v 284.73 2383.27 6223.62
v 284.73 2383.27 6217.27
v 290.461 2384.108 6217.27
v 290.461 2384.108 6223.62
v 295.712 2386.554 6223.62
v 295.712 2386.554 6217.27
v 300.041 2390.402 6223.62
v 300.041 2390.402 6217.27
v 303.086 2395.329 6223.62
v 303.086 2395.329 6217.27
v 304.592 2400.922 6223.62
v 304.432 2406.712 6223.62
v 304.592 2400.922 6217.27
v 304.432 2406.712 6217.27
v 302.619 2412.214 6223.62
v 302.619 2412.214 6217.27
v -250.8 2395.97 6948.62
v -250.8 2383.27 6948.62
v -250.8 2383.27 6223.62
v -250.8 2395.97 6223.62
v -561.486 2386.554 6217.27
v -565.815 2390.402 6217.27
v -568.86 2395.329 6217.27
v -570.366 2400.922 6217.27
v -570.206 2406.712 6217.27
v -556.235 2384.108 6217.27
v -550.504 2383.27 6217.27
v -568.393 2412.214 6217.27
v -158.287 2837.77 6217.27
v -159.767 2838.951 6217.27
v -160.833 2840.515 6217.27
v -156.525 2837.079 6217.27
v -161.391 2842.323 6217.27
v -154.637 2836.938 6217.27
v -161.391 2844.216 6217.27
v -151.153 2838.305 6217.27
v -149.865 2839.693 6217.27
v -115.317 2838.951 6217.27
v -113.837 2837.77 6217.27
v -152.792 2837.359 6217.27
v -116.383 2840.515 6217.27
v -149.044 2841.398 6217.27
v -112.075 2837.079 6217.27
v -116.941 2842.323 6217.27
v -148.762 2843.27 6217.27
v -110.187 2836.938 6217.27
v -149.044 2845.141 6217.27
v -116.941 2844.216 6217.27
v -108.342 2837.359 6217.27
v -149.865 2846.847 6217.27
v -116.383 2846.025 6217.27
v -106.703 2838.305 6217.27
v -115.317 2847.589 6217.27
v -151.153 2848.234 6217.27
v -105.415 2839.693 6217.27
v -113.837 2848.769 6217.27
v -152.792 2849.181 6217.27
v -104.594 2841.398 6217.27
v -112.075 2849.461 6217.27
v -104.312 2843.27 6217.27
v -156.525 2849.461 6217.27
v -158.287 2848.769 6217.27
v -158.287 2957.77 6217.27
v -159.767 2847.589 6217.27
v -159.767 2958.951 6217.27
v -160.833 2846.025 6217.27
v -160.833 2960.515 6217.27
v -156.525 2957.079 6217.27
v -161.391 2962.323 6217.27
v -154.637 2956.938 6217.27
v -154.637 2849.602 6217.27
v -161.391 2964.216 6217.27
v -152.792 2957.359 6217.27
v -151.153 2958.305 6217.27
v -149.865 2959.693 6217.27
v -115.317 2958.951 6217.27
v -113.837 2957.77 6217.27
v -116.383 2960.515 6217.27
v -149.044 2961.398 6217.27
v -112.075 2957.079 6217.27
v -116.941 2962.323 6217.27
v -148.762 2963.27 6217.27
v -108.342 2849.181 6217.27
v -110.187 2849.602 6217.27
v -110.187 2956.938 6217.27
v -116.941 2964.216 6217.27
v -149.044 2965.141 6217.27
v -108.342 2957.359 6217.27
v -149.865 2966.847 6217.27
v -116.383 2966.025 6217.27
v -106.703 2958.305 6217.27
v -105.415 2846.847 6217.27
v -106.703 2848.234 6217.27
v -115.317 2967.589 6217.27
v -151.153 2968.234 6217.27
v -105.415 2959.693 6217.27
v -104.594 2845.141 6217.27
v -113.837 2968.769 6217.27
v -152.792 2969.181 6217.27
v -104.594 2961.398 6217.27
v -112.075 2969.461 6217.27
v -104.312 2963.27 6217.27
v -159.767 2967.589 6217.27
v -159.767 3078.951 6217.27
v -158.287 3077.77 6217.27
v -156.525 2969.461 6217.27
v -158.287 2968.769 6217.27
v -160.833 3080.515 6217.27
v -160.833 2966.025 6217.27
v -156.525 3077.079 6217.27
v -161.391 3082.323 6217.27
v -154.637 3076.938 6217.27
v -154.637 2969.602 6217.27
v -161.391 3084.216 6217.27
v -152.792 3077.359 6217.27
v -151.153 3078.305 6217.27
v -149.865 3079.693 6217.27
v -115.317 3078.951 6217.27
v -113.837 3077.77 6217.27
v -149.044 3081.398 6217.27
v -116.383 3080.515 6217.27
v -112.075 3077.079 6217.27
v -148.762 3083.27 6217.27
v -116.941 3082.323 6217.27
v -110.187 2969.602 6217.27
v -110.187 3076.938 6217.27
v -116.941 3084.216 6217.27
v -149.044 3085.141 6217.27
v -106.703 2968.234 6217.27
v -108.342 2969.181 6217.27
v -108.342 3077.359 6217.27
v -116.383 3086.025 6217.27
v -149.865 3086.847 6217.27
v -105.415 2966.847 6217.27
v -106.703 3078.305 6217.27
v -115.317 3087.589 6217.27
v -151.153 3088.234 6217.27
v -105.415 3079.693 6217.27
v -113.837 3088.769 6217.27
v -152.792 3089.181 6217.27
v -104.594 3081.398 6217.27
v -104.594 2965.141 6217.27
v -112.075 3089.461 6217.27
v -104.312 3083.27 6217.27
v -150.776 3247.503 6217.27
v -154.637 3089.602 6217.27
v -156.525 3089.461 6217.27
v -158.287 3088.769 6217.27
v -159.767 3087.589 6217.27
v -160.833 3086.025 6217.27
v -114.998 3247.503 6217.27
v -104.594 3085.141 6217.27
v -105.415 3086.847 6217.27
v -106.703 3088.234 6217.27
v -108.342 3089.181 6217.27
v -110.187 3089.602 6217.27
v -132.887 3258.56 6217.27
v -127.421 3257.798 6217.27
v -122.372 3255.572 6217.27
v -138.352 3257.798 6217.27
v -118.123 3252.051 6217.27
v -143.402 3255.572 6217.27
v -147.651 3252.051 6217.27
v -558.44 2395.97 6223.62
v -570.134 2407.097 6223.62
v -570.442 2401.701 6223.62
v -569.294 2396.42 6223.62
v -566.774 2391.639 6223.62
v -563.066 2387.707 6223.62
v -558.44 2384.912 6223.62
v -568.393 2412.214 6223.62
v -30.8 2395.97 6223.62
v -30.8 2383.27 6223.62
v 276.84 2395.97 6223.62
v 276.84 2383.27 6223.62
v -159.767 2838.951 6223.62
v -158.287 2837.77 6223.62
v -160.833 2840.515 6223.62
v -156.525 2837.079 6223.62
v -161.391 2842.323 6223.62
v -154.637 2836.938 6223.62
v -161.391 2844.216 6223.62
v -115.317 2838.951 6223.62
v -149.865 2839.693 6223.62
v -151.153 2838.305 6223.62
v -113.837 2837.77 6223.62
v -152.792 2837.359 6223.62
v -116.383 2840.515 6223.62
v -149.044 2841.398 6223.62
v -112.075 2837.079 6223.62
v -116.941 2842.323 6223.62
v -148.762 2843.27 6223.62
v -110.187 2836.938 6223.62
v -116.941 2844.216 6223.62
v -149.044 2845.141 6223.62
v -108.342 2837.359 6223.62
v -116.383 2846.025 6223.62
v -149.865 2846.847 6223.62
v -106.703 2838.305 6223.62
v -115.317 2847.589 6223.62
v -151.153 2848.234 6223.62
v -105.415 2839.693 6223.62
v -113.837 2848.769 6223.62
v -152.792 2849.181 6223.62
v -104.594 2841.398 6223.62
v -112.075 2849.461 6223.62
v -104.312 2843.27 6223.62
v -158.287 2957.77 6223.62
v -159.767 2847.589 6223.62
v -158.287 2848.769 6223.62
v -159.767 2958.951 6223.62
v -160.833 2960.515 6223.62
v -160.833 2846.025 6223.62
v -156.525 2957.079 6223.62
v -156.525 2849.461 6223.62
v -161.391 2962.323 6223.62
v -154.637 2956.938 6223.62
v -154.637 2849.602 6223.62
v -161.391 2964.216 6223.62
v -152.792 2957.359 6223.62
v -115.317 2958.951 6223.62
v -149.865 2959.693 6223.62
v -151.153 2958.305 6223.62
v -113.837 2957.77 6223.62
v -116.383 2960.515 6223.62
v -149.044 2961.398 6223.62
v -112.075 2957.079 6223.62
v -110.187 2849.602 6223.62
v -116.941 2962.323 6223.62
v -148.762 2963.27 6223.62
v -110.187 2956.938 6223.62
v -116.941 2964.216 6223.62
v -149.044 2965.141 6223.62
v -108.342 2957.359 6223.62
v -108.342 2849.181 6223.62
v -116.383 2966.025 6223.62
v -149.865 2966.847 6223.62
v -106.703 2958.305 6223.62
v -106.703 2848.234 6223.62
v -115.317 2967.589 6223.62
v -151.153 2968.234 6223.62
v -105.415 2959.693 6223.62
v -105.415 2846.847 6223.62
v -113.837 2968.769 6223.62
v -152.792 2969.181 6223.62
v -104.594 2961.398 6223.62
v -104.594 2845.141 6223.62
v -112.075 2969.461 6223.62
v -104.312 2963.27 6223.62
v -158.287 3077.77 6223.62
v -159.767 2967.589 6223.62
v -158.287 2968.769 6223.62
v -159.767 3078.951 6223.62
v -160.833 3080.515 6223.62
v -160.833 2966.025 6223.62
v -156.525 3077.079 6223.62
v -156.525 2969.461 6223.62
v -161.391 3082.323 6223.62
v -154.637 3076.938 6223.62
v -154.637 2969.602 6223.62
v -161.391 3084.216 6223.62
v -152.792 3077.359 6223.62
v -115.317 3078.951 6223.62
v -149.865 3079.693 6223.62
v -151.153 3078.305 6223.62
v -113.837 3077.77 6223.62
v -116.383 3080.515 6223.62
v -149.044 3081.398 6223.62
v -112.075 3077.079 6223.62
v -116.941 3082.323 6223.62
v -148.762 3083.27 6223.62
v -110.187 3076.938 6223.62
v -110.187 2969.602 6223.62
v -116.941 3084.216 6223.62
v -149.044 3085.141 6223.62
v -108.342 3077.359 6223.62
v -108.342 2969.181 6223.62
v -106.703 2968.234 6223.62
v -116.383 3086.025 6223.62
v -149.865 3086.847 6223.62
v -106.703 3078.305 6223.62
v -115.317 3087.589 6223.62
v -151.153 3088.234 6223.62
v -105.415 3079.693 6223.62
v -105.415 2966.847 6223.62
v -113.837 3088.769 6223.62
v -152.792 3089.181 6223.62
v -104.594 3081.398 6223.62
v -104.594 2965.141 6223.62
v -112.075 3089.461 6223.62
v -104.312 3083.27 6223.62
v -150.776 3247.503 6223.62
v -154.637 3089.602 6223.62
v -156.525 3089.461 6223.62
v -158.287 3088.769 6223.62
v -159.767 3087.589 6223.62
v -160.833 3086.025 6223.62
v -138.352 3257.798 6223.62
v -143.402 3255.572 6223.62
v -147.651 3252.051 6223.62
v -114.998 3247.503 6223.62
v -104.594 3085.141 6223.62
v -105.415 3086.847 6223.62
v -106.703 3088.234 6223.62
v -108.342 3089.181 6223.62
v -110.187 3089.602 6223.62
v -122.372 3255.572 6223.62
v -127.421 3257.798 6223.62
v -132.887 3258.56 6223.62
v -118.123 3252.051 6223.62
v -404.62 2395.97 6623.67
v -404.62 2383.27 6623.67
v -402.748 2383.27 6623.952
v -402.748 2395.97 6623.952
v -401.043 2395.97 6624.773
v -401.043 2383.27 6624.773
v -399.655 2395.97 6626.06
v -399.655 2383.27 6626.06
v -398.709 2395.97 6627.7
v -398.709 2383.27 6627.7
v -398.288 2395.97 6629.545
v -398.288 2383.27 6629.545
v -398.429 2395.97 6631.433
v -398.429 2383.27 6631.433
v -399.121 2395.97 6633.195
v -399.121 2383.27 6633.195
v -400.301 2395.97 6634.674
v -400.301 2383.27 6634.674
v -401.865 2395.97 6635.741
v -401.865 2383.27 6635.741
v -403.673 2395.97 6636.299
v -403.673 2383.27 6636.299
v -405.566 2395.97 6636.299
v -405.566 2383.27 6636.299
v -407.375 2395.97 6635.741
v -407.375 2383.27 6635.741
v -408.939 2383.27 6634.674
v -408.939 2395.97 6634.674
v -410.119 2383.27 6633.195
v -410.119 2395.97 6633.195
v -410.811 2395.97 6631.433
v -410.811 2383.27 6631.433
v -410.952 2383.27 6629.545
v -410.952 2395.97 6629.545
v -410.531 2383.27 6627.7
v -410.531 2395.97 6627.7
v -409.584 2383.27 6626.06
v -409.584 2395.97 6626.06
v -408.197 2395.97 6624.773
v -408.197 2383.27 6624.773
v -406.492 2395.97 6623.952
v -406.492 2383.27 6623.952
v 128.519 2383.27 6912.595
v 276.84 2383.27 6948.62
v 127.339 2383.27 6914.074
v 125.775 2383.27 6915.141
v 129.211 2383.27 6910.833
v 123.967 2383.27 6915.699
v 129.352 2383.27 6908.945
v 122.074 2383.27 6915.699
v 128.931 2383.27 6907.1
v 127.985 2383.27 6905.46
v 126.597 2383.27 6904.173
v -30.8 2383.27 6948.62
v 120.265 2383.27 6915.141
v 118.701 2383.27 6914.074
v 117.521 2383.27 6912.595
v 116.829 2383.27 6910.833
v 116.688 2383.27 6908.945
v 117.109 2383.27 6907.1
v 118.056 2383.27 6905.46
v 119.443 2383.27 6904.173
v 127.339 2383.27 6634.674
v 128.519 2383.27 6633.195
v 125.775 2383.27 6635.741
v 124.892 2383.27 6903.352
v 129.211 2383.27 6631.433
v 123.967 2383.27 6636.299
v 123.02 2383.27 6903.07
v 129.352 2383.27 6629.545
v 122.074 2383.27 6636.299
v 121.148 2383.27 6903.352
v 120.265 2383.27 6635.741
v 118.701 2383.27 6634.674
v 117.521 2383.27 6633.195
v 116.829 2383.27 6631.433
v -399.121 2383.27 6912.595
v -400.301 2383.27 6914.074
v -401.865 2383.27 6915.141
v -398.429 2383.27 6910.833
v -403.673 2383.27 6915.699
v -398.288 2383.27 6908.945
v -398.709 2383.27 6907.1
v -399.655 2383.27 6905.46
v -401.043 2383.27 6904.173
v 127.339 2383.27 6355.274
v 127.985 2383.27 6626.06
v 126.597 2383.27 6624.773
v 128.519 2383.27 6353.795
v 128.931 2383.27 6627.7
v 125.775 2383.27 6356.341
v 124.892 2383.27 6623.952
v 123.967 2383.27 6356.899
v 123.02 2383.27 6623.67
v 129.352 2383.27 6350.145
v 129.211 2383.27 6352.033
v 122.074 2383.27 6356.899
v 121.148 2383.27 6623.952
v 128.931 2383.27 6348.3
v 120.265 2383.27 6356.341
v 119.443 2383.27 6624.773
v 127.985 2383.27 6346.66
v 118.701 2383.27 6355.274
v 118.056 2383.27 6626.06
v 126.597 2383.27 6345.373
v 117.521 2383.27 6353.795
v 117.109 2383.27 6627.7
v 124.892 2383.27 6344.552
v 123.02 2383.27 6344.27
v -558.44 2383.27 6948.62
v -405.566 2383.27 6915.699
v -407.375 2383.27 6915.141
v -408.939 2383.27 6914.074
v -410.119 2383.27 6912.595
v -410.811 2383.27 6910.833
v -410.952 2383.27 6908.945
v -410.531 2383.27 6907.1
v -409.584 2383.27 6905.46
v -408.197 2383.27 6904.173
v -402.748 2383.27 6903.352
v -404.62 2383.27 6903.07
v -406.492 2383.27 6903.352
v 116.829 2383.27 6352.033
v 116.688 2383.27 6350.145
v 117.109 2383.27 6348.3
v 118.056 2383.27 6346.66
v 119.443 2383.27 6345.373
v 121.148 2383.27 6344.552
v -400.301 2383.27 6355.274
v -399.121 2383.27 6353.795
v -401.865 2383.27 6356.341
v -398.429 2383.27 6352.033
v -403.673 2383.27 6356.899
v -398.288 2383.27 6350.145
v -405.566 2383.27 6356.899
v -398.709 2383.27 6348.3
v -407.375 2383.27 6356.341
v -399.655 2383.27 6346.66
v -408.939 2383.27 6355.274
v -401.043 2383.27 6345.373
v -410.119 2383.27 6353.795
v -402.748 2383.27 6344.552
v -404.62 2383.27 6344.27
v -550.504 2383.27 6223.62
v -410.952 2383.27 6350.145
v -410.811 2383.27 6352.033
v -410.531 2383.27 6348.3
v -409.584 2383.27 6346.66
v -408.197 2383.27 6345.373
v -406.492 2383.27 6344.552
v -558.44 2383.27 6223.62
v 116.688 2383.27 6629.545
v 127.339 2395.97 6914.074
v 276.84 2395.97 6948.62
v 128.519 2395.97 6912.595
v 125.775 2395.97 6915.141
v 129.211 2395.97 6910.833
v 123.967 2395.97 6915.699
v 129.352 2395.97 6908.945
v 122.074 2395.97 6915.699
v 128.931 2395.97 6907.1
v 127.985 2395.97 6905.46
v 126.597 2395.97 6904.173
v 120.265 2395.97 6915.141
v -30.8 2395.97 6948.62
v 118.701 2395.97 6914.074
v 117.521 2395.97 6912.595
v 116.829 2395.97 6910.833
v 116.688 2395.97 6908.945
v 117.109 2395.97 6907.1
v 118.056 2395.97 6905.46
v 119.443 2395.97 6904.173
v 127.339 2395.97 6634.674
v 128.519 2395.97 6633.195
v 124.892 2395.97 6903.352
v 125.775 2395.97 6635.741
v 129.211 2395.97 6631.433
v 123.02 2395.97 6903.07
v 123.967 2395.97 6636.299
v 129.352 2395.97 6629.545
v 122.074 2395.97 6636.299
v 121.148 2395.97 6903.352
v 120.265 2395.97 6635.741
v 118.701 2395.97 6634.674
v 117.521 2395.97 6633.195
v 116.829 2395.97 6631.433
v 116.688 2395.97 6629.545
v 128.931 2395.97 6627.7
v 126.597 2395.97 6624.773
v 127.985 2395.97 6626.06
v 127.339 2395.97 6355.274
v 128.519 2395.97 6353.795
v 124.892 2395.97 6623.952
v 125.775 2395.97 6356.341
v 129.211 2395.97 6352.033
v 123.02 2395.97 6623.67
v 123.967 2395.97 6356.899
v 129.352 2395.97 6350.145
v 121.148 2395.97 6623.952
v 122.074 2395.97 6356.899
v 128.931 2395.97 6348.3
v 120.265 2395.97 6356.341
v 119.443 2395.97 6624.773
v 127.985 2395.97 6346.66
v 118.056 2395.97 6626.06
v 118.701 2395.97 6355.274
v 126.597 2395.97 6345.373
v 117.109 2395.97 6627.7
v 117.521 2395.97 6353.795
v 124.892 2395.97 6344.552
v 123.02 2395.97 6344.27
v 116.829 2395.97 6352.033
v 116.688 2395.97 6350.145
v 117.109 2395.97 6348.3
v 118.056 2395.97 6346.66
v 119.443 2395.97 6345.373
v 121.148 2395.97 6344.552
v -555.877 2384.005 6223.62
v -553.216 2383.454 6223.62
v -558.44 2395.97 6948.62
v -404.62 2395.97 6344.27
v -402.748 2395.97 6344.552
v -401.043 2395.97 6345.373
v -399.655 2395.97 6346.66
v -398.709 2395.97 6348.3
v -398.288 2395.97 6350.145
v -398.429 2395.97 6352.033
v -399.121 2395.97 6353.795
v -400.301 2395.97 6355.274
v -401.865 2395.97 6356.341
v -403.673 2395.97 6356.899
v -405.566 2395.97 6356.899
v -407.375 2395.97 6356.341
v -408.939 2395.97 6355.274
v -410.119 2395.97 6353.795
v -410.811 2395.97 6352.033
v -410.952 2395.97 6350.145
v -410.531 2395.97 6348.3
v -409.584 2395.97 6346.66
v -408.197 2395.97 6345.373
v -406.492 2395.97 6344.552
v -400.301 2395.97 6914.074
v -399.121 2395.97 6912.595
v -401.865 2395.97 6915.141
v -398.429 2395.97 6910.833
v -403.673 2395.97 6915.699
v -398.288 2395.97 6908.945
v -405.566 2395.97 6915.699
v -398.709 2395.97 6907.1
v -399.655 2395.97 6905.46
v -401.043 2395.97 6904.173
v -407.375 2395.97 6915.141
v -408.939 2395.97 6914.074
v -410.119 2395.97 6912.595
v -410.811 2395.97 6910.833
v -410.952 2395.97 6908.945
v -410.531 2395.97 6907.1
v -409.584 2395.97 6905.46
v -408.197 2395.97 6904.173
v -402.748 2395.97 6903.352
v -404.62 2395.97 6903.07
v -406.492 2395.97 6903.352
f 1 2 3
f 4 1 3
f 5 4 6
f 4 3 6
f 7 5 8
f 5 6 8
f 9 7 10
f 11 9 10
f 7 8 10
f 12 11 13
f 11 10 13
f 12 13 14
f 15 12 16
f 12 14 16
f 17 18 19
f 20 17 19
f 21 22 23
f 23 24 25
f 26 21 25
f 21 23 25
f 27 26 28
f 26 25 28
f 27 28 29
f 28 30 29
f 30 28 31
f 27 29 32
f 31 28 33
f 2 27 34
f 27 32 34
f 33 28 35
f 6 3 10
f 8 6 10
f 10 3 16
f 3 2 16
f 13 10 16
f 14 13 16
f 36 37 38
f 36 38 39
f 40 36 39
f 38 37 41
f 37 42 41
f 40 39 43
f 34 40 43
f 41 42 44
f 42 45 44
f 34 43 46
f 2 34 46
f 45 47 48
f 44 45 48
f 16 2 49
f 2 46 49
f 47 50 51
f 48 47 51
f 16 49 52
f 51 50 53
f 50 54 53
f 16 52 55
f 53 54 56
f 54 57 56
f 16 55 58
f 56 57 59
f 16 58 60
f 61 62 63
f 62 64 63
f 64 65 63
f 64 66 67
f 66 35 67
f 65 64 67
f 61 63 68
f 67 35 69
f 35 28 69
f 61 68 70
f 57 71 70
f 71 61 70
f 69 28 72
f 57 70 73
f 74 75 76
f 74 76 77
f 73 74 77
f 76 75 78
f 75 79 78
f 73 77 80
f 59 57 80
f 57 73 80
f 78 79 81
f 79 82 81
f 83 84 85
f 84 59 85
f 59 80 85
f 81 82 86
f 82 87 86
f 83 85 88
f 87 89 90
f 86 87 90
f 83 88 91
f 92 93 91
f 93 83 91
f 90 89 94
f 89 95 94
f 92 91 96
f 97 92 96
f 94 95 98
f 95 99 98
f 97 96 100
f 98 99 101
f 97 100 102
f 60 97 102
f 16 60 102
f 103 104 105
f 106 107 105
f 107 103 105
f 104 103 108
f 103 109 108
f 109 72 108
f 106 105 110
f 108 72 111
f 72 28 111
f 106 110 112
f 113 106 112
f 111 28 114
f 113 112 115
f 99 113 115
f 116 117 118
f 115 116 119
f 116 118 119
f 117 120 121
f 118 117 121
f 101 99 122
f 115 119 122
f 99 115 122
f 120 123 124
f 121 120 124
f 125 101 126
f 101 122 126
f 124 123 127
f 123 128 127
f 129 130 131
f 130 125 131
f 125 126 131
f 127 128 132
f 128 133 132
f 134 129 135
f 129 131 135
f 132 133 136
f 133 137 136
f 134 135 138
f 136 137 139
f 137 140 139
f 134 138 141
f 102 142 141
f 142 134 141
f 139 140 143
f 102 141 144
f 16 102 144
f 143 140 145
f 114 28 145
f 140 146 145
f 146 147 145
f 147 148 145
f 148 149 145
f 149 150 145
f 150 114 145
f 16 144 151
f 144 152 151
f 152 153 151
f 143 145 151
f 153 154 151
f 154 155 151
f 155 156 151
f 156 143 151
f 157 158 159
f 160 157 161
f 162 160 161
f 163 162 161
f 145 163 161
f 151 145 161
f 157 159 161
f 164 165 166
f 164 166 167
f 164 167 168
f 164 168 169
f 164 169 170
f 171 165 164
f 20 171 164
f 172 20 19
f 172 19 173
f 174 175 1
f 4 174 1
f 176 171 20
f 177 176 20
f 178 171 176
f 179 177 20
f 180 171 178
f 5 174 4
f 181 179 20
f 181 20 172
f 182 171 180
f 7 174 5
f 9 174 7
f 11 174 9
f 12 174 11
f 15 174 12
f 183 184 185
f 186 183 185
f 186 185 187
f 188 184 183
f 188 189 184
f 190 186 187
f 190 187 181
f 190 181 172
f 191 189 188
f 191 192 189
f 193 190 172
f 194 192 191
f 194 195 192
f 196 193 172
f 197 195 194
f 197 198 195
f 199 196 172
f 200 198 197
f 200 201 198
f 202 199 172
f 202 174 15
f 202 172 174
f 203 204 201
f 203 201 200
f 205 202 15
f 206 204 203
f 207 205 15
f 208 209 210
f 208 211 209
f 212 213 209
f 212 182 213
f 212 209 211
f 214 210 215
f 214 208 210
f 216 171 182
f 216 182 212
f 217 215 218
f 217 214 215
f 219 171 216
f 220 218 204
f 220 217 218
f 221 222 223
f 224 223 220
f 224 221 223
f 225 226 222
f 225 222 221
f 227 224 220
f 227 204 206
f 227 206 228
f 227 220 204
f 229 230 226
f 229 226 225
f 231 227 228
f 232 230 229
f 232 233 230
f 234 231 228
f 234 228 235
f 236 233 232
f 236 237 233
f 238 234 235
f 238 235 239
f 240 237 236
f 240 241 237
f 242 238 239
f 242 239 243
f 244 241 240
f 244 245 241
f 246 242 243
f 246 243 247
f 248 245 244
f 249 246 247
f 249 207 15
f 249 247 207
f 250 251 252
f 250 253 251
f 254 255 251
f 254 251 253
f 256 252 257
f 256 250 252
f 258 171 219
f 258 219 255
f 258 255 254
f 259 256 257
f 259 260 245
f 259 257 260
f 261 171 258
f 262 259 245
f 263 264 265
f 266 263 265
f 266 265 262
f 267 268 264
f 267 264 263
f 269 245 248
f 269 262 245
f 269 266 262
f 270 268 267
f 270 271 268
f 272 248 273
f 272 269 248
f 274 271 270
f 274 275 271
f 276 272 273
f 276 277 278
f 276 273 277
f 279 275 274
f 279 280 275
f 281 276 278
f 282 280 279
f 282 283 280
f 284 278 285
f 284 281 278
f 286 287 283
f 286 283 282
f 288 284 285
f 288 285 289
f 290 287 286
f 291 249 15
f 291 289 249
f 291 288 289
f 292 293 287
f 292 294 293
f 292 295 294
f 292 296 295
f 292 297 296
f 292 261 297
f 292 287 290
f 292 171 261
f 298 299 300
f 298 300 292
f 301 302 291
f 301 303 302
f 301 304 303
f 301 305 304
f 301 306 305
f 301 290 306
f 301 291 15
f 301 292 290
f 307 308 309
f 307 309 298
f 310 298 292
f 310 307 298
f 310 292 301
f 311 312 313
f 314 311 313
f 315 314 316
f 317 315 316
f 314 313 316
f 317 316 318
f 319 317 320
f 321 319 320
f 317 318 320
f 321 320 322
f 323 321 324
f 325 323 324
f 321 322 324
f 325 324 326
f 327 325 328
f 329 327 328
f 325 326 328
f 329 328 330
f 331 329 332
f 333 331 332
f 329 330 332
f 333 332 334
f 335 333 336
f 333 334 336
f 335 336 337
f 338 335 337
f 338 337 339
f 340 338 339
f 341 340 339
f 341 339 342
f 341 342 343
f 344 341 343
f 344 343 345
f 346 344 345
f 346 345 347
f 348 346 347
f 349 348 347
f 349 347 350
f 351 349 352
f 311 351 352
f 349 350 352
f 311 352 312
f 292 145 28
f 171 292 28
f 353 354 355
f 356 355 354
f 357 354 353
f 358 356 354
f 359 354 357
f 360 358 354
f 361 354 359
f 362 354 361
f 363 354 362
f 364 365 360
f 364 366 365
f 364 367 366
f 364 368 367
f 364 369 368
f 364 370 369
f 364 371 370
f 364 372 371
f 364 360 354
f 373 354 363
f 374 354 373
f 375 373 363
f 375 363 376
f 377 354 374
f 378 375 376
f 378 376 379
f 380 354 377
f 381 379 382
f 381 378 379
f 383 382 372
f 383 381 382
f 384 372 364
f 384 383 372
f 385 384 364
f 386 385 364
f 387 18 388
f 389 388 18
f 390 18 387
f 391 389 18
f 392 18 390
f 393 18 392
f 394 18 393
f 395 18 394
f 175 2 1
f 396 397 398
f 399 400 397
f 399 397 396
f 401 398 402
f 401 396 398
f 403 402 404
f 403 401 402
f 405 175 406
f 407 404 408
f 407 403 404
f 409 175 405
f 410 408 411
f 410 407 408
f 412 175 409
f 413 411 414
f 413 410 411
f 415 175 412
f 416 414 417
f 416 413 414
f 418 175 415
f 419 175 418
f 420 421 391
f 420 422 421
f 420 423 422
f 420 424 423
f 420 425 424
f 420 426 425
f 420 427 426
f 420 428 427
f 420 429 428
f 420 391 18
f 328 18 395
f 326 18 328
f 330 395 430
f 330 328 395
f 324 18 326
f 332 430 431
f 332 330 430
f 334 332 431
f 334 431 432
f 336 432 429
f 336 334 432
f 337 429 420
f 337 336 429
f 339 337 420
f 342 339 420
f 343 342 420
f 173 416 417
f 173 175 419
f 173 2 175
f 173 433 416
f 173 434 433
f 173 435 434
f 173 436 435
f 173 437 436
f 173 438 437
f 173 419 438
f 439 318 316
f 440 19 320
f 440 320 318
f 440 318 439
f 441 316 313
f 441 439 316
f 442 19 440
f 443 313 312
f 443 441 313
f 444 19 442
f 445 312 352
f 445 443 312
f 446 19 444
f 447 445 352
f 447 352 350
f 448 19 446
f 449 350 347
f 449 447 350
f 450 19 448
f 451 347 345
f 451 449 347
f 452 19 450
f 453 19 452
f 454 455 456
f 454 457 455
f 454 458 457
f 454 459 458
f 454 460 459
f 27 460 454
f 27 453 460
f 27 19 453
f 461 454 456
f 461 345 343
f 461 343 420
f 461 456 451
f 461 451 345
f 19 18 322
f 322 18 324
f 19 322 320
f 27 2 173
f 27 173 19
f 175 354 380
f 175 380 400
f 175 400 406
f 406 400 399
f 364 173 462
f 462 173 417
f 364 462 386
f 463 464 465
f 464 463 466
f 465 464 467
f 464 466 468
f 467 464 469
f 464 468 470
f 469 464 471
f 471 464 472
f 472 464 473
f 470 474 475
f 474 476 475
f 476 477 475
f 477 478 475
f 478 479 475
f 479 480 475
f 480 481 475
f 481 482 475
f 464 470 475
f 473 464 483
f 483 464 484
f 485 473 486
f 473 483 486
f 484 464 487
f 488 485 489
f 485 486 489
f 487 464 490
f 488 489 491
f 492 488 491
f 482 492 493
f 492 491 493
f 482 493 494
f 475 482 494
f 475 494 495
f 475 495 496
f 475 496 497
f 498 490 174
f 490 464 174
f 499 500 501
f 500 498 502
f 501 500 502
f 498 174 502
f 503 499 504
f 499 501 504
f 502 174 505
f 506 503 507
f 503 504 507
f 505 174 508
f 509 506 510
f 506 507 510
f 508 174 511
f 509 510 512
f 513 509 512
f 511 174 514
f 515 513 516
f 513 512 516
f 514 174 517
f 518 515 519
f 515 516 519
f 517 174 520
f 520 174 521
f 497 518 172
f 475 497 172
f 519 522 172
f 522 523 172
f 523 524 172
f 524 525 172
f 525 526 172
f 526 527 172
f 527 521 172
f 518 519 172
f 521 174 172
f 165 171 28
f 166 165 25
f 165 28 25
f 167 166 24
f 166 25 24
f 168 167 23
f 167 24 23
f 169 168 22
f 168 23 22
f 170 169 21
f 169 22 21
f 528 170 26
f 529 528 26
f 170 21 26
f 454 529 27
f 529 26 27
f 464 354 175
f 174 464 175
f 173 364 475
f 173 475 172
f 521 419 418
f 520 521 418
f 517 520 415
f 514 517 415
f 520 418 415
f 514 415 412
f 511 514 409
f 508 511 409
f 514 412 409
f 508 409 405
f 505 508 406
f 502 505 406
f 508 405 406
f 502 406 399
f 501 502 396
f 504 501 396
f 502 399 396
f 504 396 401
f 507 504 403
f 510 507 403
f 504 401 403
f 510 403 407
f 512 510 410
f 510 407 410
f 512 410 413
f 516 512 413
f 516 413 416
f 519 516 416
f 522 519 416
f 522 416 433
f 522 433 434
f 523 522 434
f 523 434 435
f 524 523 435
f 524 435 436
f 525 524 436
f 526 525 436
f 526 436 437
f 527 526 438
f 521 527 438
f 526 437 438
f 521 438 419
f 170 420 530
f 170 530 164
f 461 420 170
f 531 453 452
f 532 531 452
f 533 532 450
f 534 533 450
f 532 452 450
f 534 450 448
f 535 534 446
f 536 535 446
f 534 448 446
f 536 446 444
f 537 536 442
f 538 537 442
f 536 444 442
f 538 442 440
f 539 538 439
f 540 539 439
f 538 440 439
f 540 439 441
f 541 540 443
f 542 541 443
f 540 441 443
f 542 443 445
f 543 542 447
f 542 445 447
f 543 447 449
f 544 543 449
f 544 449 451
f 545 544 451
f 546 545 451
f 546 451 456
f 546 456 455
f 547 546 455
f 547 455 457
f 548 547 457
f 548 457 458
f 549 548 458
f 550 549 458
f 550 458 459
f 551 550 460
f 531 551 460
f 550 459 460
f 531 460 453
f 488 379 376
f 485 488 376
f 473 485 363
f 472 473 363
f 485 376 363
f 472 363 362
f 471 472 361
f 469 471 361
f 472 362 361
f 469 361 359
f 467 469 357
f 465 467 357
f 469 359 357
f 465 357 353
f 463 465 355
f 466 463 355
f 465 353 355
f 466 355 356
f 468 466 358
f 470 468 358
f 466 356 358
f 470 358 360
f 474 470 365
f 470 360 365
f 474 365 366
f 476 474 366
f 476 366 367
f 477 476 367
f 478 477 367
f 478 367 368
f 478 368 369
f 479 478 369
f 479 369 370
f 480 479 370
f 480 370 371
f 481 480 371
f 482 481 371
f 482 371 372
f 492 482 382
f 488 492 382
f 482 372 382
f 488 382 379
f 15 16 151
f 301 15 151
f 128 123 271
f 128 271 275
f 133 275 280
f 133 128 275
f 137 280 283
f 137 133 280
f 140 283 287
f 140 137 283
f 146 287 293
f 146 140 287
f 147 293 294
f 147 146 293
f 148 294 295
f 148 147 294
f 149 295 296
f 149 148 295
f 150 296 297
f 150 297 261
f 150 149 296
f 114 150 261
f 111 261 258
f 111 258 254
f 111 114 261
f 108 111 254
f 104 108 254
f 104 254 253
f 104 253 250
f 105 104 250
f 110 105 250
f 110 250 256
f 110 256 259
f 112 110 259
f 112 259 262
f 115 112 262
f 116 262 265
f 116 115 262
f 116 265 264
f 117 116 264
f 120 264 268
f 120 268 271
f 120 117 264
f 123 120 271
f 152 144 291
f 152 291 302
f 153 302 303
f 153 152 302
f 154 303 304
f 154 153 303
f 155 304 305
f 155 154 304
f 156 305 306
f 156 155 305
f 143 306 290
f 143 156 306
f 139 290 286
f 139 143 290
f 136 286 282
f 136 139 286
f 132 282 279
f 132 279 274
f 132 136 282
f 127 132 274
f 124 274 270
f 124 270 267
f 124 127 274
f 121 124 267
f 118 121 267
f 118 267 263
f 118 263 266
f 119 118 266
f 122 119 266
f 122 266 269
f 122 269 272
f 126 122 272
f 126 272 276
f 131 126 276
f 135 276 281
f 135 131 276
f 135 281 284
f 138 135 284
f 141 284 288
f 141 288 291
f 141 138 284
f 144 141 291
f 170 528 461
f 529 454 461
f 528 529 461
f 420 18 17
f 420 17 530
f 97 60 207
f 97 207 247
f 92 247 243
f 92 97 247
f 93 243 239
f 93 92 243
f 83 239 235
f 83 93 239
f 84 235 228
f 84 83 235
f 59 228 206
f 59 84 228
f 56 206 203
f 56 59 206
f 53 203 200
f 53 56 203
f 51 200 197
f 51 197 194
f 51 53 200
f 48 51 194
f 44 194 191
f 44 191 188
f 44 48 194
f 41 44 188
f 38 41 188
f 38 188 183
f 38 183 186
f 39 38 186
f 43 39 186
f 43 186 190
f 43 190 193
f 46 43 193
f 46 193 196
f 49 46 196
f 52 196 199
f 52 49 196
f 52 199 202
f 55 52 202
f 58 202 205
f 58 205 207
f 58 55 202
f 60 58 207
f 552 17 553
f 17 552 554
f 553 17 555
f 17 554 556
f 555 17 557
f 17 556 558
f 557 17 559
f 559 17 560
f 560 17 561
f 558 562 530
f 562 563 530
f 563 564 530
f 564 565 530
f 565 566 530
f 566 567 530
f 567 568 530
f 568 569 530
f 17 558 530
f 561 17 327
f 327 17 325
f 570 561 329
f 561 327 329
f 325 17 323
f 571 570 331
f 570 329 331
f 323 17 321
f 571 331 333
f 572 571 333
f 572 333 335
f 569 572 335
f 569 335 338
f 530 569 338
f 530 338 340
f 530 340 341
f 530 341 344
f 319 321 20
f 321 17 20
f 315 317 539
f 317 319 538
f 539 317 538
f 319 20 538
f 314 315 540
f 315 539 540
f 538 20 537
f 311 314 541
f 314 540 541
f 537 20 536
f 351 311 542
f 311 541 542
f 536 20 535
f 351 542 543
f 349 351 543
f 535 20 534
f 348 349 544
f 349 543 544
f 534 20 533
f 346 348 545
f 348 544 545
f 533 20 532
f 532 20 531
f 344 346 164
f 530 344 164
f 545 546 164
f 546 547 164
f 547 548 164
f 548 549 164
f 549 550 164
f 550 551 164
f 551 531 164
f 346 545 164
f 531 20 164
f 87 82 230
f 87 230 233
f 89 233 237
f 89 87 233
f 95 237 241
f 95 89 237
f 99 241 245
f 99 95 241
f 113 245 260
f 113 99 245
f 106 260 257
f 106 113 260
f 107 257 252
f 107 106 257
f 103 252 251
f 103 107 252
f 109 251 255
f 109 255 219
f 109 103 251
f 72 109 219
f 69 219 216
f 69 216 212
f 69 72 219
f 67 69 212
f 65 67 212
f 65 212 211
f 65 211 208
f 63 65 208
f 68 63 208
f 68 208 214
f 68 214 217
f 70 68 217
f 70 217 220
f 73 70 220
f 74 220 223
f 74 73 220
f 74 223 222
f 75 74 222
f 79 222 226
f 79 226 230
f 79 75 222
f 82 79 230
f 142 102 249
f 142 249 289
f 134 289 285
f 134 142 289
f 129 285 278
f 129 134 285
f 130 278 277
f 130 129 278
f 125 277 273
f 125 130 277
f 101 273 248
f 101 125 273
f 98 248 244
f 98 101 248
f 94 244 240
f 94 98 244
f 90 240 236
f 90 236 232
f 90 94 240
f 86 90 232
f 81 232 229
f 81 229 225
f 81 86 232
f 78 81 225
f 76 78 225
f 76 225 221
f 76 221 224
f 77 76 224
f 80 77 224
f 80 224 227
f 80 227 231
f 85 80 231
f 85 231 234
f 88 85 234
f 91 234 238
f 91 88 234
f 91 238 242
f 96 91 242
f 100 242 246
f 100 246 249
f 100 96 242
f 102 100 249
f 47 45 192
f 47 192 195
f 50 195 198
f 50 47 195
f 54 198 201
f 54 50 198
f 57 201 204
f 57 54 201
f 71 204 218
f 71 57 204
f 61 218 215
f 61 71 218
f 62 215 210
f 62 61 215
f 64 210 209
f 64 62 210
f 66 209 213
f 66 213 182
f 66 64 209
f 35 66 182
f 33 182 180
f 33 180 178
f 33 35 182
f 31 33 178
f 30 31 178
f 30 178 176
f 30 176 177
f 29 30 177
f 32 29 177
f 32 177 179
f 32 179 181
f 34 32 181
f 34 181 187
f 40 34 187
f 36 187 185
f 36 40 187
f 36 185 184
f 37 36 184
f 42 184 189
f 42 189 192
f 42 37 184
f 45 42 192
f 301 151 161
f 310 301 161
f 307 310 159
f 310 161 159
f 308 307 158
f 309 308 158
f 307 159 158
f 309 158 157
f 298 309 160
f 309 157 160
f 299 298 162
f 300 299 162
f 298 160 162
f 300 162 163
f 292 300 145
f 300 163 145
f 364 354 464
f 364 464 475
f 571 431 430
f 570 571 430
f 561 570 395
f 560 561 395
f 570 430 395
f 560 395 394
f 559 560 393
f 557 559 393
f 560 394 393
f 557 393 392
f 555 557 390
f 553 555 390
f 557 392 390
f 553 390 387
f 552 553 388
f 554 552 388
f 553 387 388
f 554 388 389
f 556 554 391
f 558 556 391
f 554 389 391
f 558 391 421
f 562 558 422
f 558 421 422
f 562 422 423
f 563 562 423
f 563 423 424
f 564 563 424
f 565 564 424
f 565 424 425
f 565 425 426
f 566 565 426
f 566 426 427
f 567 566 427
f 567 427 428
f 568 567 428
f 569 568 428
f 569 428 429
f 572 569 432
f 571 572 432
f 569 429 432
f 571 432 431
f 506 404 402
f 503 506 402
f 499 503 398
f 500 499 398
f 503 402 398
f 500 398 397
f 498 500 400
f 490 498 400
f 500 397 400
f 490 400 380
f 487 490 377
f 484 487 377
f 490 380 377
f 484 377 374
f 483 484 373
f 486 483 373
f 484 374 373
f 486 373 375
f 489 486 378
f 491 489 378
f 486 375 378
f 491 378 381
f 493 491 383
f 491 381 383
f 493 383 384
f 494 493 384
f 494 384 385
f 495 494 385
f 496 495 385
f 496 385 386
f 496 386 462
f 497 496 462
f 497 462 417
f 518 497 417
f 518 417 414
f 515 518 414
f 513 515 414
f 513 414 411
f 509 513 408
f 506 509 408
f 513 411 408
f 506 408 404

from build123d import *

# Parameters (mm, degrees)
SKETCH1_R           = 161.29
BOSS_EXTRUDE2_DEPTH = 161.29
SKETCH2_W           = 7814.056
SKETCH2_H           = 18415
SKETCH2_R           = 161.29
BOSS_EXTRUDE3_DEPTH = 322.58
SCALE1_SCALE        = 0.039370079


with BuildPart() as part:
    # Sketch1 → Boss-Extrude2 (new body)
    with BuildSketch(Plane.XY):
        with BuildLine():
            Line((-454.375060891, 21951.534316097), (-11061.850005226, 735.172410385))
            ThreePointArc((-11061.850005226, 735.172410385), (-11039.602, 240.922843055), (-10607.474944335, 0))
            Line((-10607.474944335, 0), (10607.474944335, 0))
            ThreePointArc((10607.474944335, 0), (11039.602, 240.922843055), (11061.850005226, 735.172410385))
            Line((11061.850005226, 735.172410385), (454.375060891, 21951.534316097))
            ThreePointArc((454.375060891, 21951.534316097), (0, 22232.361905711), (-454.375060891, 21951.534316097))
        make_face()
        with Locations((-564.515, 11684)):
            Circle(SKETCH1_R, mode=Mode.SUBTRACT)
        with Locations((-564.515, 14732)):
            Circle(SKETCH1_R, mode=Mode.SUBTRACT)
        with Locations((-564.515, 17780)):
            Circle(SKETCH1_R, mode=Mode.SUBTRACT)
        with Locations((564.515, 17780)):
            Circle(SKETCH1_R, mode=Mode.SUBTRACT)
        with Locations((564.515, 14732)):
            Circle(SKETCH1_R, mode=Mode.SUBTRACT)
        with Locations((564.515, 11684)):
            Circle(SKETCH1_R, mode=Mode.SUBTRACT)
    extrude(amount=BOSS_EXTRUDE2_DEPTH)

    # Sketch2 → Boss-Extrude3 (add)
    # profile 1 of 2: a face of its own
    with BuildSketch(Plane(origin=(0, 0, 0), x_dir=(-1, 0, 0), z_dir=(0, -1, 0))):
        with Locations((-6500.040944335, -9368.79)):
            Rectangle(SKETCH2_W, SKETCH2_H)
        with Locations(Location((-6500.040944335, -17580.61, 0), (0, 0, 90))):
            Circle(SKETCH2_R, mode=Mode.SUBTRACT)
        with Locations(Location((-6500.040944335, -10483.85, 0), (0, 0, 90))):
            Circle(SKETCH2_R, mode=Mode.SUBTRACT)
        with Locations(Location((-6500.040944335, -3387.09, 0), (0, 0, 90))):
            Circle(SKETCH2_R, mode=Mode.SUBTRACT)
    # profile 2 of 2: a face of its own
    with BuildSketch(Plane(origin=(0, 0, 0), x_dir=(-1, 0, 0), z_dir=(0, -1, 0))):
        with Locations((6902.015055665, -9368.79)):
            Rectangle(SKETCH2_W, SKETCH2_H)
        with Locations(Location((6902.015055665, -3387.09, 0), (0, 0, 90))):
            Circle(SKETCH2_R, mode=Mode.SUBTRACT)
        with Locations(Location((6902.015055665, -10483.85, 0), (0, 0, 90))):
            Circle(SKETCH2_R, mode=Mode.SUBTRACT)
        with Locations(Location((6902.015055665, -17580.61, 0), (0, 0, 90))):
            Circle(SKETCH2_R, mode=Mode.SUBTRACT)
    extrude(amount=-BOSS_EXTRUDE3_DEPTH)


with BuildPart() as part_1:
    # Scale1: scaled about (-138.333124058, 2480.944734198, 6472.075728879)
    add(part.part.scale(SCALE1_SCALE).moved(Location((-132.886938071, 2383.269744663, 6217.269597821))))


solid = part_1.part
